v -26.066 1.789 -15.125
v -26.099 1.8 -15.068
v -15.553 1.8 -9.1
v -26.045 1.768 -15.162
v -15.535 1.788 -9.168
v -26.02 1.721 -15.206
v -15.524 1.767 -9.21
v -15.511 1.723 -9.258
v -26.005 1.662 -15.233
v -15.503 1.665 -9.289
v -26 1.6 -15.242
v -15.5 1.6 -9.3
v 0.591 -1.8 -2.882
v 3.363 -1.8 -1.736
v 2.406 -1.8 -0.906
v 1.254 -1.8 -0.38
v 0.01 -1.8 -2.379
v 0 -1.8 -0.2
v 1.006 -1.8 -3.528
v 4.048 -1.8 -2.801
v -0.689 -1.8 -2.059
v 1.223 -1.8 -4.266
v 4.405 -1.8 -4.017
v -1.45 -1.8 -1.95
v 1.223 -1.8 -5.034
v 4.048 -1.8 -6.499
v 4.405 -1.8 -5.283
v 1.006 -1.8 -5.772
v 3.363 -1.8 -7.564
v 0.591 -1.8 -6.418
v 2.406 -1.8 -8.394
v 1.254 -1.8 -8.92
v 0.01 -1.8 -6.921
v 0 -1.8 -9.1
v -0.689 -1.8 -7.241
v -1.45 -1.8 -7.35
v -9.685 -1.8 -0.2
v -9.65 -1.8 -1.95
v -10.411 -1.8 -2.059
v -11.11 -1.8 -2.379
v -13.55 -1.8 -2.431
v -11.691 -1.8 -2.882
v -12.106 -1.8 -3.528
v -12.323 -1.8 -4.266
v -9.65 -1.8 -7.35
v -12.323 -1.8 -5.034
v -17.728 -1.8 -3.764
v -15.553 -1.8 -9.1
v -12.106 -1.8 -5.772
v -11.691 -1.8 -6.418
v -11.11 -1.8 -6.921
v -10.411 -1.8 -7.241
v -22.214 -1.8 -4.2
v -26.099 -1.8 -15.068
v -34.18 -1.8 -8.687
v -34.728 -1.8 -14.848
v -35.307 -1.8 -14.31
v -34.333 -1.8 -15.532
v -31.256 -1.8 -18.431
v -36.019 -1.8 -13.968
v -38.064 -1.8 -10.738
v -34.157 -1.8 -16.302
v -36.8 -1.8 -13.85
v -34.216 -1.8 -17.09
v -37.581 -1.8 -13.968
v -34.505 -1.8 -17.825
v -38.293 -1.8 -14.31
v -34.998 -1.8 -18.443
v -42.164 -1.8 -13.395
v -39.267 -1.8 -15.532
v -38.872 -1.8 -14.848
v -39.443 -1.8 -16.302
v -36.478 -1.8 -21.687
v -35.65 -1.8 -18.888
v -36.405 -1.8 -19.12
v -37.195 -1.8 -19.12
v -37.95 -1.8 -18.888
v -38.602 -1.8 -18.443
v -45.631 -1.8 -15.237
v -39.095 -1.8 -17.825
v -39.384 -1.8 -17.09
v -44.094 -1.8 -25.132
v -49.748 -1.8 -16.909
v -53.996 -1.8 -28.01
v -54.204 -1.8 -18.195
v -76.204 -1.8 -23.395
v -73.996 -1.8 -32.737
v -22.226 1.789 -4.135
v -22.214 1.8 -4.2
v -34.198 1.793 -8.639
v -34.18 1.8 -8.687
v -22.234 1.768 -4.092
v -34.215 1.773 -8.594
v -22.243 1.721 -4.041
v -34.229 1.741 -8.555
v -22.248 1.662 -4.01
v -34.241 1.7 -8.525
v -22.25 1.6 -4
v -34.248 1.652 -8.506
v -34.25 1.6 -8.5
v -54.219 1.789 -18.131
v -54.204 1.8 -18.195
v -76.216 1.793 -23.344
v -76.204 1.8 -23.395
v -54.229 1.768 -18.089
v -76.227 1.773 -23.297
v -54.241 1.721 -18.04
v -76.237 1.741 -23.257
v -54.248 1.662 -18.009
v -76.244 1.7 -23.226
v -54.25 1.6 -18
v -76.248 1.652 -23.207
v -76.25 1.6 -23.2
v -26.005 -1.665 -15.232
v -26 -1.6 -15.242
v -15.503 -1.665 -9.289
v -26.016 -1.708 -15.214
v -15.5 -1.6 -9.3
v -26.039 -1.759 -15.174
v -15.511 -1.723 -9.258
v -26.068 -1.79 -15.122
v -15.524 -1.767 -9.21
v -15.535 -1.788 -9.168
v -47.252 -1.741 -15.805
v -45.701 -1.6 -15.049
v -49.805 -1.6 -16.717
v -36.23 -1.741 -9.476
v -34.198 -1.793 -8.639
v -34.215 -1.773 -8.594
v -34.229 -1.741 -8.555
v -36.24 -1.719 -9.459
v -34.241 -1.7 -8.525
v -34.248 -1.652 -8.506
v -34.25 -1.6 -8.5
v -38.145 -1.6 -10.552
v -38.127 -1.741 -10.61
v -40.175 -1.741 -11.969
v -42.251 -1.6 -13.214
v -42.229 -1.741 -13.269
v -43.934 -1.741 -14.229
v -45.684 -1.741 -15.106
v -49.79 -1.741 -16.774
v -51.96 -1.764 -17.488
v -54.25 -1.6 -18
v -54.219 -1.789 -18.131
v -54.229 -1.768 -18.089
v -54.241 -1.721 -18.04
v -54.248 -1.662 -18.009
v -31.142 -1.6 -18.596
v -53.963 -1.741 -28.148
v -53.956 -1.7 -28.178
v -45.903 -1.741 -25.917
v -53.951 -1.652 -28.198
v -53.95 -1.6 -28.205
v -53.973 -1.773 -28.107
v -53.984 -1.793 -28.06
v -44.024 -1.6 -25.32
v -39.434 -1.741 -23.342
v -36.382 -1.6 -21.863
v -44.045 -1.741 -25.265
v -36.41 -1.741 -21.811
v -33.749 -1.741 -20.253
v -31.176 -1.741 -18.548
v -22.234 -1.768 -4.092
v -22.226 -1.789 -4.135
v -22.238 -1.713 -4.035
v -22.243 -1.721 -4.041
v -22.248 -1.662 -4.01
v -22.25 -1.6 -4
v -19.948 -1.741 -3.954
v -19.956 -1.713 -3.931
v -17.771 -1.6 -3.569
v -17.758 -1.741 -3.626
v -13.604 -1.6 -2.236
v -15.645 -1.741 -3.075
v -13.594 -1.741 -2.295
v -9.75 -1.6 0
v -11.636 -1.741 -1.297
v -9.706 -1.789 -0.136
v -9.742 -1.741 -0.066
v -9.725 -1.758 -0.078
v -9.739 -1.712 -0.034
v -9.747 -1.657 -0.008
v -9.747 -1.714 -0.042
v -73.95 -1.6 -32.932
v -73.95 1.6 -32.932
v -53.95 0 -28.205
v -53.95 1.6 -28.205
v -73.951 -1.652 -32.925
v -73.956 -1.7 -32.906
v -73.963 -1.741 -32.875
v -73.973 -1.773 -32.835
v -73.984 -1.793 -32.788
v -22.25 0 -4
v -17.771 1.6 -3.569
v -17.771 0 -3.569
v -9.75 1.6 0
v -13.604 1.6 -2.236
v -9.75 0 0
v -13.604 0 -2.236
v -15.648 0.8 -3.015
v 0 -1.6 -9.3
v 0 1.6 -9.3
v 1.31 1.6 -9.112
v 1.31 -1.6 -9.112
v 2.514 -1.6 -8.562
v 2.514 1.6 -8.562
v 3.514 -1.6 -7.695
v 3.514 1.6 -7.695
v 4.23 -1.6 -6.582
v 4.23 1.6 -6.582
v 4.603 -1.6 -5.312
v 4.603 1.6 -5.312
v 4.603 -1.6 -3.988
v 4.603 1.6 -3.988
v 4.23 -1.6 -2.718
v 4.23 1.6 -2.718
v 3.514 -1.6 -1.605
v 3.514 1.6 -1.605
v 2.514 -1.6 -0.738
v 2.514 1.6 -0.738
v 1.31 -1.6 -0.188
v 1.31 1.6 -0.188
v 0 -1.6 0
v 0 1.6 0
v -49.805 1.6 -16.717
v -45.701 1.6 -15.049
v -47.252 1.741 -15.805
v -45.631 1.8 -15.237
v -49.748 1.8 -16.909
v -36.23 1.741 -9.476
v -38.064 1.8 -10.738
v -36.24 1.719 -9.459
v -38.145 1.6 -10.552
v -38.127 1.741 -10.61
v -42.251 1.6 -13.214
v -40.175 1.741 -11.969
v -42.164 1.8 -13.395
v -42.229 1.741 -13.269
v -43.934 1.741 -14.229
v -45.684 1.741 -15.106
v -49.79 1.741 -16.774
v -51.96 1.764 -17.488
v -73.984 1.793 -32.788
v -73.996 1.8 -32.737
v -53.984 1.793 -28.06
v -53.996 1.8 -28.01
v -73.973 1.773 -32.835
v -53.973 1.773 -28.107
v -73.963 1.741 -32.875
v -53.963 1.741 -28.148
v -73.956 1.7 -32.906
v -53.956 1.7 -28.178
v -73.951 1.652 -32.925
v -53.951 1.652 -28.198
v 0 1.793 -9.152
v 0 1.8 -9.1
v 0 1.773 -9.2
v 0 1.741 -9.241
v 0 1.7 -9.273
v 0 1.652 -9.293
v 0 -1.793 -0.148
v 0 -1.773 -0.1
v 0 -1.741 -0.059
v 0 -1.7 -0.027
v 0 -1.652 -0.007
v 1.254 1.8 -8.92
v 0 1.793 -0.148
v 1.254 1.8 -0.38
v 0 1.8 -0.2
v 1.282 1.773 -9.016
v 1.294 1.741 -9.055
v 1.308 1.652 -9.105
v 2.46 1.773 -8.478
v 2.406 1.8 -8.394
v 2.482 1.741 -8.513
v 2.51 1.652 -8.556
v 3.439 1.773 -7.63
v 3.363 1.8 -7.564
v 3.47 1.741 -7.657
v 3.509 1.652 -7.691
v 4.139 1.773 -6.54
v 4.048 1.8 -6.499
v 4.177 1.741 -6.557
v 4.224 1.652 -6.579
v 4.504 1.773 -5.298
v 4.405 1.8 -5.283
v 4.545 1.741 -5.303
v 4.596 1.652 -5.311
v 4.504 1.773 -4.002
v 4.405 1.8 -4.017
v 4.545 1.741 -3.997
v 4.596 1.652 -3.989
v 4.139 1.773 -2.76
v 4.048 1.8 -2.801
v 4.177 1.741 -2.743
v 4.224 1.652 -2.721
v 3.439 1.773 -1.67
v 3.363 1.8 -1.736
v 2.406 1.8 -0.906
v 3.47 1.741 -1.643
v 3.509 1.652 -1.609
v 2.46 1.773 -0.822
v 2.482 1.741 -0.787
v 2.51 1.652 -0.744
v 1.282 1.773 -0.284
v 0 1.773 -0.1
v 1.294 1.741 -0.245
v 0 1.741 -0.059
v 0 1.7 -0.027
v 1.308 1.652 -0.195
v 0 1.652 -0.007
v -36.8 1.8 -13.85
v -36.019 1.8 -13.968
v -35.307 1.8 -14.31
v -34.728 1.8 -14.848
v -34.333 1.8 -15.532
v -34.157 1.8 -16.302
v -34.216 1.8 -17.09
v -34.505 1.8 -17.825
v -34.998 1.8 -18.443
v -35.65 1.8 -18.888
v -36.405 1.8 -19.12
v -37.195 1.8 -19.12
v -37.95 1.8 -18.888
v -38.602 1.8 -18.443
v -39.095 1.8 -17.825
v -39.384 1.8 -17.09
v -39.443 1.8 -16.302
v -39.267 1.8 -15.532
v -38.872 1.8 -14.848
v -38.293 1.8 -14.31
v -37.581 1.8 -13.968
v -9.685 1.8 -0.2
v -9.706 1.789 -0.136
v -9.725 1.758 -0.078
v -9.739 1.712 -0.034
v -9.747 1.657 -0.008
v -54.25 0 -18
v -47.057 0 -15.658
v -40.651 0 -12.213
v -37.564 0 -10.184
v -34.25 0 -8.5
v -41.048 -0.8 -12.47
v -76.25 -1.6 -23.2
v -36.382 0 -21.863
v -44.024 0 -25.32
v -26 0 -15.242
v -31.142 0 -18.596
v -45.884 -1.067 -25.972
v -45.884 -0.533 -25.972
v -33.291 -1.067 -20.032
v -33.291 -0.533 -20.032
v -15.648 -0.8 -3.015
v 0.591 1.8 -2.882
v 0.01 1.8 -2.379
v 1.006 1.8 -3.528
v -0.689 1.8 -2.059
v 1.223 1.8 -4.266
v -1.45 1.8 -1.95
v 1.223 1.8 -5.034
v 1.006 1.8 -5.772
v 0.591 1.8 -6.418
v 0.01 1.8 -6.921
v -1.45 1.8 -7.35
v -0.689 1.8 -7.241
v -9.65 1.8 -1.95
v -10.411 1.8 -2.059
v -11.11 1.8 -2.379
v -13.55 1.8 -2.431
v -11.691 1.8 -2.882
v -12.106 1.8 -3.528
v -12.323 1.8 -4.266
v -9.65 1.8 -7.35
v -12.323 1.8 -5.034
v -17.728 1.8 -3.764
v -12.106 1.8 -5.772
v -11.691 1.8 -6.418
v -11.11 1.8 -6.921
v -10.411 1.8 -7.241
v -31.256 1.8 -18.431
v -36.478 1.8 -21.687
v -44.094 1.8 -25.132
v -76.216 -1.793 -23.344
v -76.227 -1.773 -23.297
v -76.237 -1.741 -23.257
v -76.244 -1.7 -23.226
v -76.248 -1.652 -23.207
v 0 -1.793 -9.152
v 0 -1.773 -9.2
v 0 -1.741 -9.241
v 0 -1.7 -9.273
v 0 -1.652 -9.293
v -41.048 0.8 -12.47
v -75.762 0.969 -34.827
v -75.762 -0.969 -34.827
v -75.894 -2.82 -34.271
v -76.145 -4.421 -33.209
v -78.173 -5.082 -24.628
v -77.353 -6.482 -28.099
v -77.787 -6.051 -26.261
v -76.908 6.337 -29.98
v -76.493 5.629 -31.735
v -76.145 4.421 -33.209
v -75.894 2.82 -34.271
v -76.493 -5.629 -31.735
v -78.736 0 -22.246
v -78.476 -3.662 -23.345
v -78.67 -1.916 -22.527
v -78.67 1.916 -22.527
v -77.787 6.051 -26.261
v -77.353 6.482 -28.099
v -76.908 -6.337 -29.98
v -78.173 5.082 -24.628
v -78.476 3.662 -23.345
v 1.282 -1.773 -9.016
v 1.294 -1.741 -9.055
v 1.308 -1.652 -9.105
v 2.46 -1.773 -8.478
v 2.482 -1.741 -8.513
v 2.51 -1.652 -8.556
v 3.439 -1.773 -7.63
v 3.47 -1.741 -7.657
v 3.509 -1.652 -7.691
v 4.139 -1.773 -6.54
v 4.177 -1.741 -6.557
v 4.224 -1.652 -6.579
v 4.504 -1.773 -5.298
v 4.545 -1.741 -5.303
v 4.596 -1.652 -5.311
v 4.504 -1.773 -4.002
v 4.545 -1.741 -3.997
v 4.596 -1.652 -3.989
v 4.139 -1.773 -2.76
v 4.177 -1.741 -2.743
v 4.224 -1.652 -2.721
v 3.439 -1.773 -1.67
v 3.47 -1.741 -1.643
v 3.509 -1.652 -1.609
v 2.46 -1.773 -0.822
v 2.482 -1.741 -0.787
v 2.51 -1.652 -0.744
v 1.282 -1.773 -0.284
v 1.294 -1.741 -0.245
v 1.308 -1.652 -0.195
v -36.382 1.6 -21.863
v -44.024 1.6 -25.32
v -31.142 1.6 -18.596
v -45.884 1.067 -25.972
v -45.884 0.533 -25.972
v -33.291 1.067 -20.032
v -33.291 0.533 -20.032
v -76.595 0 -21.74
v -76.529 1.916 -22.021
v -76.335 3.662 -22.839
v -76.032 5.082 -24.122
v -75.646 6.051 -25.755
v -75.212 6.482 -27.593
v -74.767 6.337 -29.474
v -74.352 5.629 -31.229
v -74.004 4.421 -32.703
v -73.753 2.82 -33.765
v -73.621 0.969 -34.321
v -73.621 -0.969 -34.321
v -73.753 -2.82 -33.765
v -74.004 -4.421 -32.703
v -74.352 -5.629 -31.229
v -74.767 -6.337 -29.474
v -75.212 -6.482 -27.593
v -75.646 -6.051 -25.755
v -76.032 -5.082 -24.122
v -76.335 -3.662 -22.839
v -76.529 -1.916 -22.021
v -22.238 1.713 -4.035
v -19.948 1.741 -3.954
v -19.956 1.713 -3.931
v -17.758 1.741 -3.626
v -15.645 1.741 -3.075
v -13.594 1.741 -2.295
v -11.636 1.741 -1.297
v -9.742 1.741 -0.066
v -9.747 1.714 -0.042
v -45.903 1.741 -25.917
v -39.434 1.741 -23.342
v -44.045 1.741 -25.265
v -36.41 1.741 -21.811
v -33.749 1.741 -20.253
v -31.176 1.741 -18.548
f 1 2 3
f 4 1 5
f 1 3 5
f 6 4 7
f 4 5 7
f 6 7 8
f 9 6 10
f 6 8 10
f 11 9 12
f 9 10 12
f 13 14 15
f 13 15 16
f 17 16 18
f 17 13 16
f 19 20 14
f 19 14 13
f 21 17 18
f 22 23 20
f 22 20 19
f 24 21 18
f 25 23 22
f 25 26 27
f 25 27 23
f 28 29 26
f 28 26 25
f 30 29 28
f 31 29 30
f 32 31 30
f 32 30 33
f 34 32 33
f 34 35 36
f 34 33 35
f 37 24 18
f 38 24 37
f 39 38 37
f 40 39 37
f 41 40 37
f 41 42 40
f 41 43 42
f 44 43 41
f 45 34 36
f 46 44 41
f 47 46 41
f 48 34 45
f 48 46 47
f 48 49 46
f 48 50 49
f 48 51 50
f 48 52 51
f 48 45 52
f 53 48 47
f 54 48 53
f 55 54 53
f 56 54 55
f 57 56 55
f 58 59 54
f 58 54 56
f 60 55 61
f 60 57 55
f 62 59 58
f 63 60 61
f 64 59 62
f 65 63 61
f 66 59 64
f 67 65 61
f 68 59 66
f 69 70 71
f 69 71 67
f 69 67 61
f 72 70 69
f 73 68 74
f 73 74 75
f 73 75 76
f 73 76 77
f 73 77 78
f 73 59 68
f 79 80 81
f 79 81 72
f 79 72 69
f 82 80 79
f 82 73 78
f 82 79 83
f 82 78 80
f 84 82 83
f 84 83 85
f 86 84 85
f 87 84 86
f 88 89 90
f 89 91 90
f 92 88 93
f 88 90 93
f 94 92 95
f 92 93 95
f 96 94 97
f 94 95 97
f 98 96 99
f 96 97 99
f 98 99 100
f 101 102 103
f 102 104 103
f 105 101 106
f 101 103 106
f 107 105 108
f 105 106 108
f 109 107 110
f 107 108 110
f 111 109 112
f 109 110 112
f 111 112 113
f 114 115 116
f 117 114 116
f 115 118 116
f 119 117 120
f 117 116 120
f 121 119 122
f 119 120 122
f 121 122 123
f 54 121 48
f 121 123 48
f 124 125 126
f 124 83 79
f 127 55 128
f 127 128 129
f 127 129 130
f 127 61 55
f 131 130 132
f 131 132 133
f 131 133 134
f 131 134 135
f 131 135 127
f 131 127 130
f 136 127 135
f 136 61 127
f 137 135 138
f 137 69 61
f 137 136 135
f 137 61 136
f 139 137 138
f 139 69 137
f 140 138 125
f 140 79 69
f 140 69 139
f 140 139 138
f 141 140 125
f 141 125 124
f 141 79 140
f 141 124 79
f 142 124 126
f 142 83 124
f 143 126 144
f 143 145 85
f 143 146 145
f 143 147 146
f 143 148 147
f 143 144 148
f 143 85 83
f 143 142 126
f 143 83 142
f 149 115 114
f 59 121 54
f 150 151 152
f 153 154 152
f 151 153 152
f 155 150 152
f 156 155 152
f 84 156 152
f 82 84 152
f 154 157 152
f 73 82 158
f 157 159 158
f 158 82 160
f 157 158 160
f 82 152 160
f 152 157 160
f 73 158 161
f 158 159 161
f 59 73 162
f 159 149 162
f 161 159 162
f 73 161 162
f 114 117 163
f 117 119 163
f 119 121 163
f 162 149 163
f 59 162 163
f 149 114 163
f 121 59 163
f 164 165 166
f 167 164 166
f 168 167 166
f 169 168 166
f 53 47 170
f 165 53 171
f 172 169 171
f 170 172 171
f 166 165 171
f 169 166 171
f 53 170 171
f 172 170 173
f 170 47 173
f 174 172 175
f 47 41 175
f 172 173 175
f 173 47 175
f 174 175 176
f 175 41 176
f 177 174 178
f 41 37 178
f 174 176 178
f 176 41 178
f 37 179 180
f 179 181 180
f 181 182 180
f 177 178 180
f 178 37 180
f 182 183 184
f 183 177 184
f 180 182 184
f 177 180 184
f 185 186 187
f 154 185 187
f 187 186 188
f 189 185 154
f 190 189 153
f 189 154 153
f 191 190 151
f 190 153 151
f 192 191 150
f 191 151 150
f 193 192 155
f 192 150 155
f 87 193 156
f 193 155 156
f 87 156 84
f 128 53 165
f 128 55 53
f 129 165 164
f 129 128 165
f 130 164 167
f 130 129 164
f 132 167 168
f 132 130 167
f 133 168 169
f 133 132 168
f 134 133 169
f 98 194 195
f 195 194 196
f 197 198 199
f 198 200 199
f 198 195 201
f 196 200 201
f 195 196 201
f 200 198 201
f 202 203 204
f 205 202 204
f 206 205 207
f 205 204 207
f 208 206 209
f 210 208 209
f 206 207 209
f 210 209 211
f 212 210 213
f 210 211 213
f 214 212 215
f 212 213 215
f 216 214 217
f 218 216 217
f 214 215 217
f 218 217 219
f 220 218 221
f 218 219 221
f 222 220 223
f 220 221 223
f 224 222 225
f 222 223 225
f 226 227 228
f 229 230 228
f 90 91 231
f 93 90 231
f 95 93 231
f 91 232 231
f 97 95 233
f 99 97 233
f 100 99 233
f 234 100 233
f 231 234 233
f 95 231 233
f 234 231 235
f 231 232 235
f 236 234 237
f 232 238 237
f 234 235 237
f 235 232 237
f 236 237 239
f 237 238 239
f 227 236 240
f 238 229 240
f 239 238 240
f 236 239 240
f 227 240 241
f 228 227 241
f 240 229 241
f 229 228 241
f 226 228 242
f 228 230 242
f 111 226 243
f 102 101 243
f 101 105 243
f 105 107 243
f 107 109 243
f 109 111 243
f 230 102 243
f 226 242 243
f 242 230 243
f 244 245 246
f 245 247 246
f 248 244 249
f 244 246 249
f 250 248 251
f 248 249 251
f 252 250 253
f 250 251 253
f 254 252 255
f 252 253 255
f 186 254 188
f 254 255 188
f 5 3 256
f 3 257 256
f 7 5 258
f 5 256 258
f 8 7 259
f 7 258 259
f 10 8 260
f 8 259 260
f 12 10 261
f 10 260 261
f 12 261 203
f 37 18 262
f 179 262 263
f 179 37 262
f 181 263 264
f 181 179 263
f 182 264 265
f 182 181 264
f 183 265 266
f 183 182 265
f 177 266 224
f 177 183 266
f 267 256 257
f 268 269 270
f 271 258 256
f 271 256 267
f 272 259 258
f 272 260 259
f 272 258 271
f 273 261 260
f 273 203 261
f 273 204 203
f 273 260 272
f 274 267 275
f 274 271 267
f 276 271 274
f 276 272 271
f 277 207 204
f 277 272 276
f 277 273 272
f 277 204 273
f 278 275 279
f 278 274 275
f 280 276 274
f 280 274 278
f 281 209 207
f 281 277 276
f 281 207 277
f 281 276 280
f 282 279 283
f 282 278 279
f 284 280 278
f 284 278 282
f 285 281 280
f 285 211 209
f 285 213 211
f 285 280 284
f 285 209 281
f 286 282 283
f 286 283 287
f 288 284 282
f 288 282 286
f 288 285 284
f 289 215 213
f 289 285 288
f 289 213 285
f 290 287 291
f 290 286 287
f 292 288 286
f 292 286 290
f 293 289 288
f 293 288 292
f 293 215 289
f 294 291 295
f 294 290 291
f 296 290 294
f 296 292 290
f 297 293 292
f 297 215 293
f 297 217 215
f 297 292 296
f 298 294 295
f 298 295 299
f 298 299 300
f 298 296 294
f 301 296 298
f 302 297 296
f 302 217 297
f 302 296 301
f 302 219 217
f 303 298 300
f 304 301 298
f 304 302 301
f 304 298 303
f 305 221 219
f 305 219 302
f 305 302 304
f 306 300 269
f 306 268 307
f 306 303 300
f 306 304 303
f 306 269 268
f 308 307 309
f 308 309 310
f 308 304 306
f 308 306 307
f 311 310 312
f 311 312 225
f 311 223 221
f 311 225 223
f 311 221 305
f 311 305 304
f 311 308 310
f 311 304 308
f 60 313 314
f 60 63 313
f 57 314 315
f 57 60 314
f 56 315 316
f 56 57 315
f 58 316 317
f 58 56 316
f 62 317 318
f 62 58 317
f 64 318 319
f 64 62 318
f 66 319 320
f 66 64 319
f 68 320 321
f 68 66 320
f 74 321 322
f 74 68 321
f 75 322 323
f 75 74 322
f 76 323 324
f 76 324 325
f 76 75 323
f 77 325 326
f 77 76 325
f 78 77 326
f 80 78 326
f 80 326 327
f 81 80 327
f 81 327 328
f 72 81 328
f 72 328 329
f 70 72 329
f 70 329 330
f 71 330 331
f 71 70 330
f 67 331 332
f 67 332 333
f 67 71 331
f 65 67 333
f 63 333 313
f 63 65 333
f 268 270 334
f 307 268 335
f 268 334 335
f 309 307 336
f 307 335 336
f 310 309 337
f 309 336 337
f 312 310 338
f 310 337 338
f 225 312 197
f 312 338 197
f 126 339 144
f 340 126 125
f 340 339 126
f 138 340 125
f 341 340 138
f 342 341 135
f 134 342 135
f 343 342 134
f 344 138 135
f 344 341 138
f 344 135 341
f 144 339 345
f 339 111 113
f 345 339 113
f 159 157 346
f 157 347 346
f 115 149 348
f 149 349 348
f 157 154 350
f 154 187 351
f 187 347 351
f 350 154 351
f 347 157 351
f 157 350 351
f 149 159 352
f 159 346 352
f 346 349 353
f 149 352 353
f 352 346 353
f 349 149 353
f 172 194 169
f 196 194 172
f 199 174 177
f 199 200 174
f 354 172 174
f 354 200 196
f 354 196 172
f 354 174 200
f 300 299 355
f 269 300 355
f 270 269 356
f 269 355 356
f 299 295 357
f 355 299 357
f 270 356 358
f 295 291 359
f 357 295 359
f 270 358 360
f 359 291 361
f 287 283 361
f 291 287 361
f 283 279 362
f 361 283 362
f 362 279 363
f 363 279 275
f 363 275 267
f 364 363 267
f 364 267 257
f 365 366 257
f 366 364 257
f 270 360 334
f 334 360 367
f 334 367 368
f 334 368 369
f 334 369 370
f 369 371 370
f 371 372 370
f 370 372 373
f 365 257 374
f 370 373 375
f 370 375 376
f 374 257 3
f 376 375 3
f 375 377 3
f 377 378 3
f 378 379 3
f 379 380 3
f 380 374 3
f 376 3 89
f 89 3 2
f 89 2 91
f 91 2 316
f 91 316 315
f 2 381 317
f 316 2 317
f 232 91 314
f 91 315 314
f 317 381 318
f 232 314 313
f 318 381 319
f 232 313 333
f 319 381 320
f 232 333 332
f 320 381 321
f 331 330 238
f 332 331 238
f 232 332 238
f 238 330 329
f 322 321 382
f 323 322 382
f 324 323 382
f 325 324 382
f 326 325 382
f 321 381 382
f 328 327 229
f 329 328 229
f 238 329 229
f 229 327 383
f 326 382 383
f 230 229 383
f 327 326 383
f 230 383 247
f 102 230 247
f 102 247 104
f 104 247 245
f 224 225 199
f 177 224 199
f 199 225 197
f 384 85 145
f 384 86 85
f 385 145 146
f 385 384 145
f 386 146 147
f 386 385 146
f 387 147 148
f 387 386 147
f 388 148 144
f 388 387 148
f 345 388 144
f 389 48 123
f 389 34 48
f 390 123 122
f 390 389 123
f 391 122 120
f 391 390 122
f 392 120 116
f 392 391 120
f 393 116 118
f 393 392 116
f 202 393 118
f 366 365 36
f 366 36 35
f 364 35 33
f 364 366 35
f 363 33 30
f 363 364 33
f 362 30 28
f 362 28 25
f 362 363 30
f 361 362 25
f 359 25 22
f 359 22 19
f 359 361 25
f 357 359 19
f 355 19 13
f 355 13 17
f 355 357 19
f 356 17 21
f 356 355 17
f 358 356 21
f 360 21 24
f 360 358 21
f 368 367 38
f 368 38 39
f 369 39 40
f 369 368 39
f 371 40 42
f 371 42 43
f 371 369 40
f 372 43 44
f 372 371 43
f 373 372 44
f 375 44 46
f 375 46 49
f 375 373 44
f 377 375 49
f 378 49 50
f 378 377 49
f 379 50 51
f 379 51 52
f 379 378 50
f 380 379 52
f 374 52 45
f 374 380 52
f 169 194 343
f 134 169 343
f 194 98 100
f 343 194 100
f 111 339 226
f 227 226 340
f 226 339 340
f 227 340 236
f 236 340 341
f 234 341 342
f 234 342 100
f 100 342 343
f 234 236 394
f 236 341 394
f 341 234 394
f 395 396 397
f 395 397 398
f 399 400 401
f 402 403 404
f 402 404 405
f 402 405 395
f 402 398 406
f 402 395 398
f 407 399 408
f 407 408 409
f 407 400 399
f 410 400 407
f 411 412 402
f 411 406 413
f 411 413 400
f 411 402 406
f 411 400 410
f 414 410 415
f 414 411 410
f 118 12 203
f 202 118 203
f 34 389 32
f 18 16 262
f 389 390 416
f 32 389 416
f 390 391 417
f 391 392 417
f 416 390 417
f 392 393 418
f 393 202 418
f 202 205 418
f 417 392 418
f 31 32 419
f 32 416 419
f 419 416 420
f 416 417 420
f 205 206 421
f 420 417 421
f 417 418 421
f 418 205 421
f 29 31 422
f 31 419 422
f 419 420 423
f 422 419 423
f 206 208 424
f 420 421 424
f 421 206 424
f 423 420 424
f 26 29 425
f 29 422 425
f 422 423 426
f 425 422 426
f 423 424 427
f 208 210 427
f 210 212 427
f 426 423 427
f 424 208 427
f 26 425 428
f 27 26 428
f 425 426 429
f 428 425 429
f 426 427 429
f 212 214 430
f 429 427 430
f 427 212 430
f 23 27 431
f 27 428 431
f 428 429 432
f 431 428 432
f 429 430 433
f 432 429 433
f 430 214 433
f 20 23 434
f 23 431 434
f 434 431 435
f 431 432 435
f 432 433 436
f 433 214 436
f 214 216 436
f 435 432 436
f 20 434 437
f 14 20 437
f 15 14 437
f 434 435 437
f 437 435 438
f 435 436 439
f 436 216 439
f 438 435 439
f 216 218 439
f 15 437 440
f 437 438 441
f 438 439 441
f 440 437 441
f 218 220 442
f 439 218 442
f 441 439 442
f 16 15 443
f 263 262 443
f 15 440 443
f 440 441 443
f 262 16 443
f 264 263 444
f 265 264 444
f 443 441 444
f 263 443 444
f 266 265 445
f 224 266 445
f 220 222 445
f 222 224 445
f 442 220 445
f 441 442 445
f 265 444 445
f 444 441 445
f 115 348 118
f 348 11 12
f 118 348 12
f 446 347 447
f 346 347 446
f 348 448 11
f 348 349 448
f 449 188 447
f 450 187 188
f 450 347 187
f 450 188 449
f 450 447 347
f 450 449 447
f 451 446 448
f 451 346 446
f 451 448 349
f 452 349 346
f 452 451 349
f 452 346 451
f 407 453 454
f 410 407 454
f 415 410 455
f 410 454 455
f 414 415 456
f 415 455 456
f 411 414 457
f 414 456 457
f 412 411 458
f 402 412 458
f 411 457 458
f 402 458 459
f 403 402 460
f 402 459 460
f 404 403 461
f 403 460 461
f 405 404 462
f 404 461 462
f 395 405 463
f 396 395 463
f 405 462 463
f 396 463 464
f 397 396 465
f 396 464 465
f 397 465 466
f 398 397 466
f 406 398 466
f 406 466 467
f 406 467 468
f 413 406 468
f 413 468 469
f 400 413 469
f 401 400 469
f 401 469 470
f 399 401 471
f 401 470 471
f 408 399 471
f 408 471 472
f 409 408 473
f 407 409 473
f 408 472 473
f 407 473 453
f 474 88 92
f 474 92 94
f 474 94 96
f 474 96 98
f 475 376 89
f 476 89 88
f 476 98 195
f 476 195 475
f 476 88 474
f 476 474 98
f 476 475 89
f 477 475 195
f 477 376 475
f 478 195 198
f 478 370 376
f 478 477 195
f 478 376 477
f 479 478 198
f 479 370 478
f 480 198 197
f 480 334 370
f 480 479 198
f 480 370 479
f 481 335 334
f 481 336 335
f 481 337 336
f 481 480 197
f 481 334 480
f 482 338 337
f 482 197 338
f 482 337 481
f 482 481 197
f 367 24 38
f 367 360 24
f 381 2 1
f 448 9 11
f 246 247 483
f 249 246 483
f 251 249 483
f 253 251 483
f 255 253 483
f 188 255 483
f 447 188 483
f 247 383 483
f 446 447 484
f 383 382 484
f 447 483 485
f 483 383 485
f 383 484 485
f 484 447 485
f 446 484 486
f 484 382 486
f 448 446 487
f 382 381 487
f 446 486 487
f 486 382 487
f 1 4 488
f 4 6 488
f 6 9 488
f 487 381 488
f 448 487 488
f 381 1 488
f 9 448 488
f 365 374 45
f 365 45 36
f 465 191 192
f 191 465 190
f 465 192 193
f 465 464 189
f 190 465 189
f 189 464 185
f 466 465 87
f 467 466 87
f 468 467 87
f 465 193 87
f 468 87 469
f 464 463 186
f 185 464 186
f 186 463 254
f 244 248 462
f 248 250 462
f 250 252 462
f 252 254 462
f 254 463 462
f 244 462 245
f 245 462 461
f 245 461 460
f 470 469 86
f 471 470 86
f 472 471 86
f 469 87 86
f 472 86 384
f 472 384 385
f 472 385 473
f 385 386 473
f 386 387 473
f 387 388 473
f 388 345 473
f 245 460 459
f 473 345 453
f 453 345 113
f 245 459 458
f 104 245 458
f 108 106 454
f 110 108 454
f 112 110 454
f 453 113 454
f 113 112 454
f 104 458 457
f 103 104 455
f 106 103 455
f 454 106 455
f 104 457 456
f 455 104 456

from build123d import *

# Parameters (mm, degrees)
SKETCH_1_R      = 2.65
EXTRUDE_1_DEPTH = 1.8
SKETCH_4_R      = 6.5
EXTRUDE_2_DEPTH = 2.2
FILLET_1_R      = 0.2


with BuildPart() as part:
    # Эскиз1 → Бобышка-Вытянуть1 (new, symmetric)
    with BuildSketch(Plane(origin=(0, 0, 0), x_dir=(1, 0, 0), z_dir=(0, 1, 0))):
        with BuildLine():
            Line((0, 0), (-9.75, 0))
            add(Edge.make_bspline(
                [(-22.25, 4), (-15.296798857, 4.030038289), (-9.75, 0)],
                knots=[0, 0, 0, 1, 1, 1], degree=2))
            Line((-22.25, 4), (-34.25, 8.5))
            add(Edge.make_bspline(
                [(-54.25, 18), (-49.273096964, 16.823641101), (-42.69144993, 14.029585327), (-36.752072816, 9.438277306), (-34.25, 8.5)],
                knots=[0, 0, 0, 0, 0.645146277, 1, 1, 1, 1], degree=3))
            Line((-54.25, 18), (-76.25, 23.2))
            Line((-76.25, 23.2), (-73.949745461, 32.931846128))
            Line((-73.949745461, 32.931846128), (-53.949745461, 28.2045734))
            add(Edge.make_bspline(
                [(-53.949745461, 28.2045734), (-51.225020143, 27.560547416), (-44.046103857, 25.680126804), (-34.543464428, 21.322196006), (-28.505950684, 16.660004334), (-26, 15.241899011)],
                knots=[0, 0, 0, 0, 0.269807929, 0.718748442, 1, 1, 1, 1], degree=3))
            Line((-26, 15.241899011), (-15.5, 9.3))
            Line((-15.5, 9.3), (0, 9.3))
            ThreePointArc((0, 9.3), (4.65, 4.65), (0, 0))
        make_face()
        with Locations(Location((-36.8, 16.5, 0), (0, 0, 270))):
            Circle(SKETCH_1_R, mode=Mode.SUBTRACT)
        with BuildLine():
            Line((-1.45, 1.95), (-9.65, 1.95))
            ThreePointArc((-9.65, 1.95), (-12.35, 4.65), (-9.65, 7.35))
            Line((-9.65, 7.35), (-1.45, 7.35))
            ThreePointArc((-1.45, 7.35), (1.25, 4.65), (-1.45, 1.95))
        make_face(mode=Mode.SUBTRACT)
    extrude(amount=EXTRUDE_1_DEPTH, both=True)

    # Эскиз4 → Бобышка-Вытянуть2 (add)
    with BuildSketch(Plane(origin=(-77.408969944, 0, -18.296665623), x_dir=(-0.2300254539289697, 0, 0.9731846127764102), z_dir=(-0.9731846127764103, 0, -0.23002545392896973))):
        with Locations((-10.038442154, 0)):
            Circle(SKETCH_4_R)
    extrude(amount=EXTRUDE_2_DEPTH)

    # Скругление1
    fillet_1_edges = [part.edges().sort_by_distance(p)[0] for p in [
        (-20.75, 1.8, -12.270949505),
        (-4.875, -1.8, 0),
        (-15.672091437, -1.8, -3.022584392),
        (-28.25, -1.8, -6.25),
        (-43.846066751, -1.8, -14.115535877),
        (-65.25, -1.8, -20.6),
        (-63.949745461, -1.8, -30.568209764),
        (-39.242509002, -1.8, -23.316914453),
        (-39.242509002, 1.8, -23.316914453),
        (-20.75, -1.8, -12.270949505),
        (-7.75, -1.8, -9.3),
        (4.65, -1.8, -4.65),
        (-63.949745461, 1.8, -30.568209764),
        (-65.25, 1.8, -20.6),
        (-43.846066751, 1.8, -14.115535877),
        (-28.25, 1.8, -6.25),
        (-15.672091437, 1.8, -3.022584392),
        (-4.875, 1.8, 0),
        (4.65, 1.8, -4.65),
        (-7.75, 1.8, -9.3),
    ]]
    fillet(fillet_1_edges, radius=FILLET_1_R)


solid = part.part
